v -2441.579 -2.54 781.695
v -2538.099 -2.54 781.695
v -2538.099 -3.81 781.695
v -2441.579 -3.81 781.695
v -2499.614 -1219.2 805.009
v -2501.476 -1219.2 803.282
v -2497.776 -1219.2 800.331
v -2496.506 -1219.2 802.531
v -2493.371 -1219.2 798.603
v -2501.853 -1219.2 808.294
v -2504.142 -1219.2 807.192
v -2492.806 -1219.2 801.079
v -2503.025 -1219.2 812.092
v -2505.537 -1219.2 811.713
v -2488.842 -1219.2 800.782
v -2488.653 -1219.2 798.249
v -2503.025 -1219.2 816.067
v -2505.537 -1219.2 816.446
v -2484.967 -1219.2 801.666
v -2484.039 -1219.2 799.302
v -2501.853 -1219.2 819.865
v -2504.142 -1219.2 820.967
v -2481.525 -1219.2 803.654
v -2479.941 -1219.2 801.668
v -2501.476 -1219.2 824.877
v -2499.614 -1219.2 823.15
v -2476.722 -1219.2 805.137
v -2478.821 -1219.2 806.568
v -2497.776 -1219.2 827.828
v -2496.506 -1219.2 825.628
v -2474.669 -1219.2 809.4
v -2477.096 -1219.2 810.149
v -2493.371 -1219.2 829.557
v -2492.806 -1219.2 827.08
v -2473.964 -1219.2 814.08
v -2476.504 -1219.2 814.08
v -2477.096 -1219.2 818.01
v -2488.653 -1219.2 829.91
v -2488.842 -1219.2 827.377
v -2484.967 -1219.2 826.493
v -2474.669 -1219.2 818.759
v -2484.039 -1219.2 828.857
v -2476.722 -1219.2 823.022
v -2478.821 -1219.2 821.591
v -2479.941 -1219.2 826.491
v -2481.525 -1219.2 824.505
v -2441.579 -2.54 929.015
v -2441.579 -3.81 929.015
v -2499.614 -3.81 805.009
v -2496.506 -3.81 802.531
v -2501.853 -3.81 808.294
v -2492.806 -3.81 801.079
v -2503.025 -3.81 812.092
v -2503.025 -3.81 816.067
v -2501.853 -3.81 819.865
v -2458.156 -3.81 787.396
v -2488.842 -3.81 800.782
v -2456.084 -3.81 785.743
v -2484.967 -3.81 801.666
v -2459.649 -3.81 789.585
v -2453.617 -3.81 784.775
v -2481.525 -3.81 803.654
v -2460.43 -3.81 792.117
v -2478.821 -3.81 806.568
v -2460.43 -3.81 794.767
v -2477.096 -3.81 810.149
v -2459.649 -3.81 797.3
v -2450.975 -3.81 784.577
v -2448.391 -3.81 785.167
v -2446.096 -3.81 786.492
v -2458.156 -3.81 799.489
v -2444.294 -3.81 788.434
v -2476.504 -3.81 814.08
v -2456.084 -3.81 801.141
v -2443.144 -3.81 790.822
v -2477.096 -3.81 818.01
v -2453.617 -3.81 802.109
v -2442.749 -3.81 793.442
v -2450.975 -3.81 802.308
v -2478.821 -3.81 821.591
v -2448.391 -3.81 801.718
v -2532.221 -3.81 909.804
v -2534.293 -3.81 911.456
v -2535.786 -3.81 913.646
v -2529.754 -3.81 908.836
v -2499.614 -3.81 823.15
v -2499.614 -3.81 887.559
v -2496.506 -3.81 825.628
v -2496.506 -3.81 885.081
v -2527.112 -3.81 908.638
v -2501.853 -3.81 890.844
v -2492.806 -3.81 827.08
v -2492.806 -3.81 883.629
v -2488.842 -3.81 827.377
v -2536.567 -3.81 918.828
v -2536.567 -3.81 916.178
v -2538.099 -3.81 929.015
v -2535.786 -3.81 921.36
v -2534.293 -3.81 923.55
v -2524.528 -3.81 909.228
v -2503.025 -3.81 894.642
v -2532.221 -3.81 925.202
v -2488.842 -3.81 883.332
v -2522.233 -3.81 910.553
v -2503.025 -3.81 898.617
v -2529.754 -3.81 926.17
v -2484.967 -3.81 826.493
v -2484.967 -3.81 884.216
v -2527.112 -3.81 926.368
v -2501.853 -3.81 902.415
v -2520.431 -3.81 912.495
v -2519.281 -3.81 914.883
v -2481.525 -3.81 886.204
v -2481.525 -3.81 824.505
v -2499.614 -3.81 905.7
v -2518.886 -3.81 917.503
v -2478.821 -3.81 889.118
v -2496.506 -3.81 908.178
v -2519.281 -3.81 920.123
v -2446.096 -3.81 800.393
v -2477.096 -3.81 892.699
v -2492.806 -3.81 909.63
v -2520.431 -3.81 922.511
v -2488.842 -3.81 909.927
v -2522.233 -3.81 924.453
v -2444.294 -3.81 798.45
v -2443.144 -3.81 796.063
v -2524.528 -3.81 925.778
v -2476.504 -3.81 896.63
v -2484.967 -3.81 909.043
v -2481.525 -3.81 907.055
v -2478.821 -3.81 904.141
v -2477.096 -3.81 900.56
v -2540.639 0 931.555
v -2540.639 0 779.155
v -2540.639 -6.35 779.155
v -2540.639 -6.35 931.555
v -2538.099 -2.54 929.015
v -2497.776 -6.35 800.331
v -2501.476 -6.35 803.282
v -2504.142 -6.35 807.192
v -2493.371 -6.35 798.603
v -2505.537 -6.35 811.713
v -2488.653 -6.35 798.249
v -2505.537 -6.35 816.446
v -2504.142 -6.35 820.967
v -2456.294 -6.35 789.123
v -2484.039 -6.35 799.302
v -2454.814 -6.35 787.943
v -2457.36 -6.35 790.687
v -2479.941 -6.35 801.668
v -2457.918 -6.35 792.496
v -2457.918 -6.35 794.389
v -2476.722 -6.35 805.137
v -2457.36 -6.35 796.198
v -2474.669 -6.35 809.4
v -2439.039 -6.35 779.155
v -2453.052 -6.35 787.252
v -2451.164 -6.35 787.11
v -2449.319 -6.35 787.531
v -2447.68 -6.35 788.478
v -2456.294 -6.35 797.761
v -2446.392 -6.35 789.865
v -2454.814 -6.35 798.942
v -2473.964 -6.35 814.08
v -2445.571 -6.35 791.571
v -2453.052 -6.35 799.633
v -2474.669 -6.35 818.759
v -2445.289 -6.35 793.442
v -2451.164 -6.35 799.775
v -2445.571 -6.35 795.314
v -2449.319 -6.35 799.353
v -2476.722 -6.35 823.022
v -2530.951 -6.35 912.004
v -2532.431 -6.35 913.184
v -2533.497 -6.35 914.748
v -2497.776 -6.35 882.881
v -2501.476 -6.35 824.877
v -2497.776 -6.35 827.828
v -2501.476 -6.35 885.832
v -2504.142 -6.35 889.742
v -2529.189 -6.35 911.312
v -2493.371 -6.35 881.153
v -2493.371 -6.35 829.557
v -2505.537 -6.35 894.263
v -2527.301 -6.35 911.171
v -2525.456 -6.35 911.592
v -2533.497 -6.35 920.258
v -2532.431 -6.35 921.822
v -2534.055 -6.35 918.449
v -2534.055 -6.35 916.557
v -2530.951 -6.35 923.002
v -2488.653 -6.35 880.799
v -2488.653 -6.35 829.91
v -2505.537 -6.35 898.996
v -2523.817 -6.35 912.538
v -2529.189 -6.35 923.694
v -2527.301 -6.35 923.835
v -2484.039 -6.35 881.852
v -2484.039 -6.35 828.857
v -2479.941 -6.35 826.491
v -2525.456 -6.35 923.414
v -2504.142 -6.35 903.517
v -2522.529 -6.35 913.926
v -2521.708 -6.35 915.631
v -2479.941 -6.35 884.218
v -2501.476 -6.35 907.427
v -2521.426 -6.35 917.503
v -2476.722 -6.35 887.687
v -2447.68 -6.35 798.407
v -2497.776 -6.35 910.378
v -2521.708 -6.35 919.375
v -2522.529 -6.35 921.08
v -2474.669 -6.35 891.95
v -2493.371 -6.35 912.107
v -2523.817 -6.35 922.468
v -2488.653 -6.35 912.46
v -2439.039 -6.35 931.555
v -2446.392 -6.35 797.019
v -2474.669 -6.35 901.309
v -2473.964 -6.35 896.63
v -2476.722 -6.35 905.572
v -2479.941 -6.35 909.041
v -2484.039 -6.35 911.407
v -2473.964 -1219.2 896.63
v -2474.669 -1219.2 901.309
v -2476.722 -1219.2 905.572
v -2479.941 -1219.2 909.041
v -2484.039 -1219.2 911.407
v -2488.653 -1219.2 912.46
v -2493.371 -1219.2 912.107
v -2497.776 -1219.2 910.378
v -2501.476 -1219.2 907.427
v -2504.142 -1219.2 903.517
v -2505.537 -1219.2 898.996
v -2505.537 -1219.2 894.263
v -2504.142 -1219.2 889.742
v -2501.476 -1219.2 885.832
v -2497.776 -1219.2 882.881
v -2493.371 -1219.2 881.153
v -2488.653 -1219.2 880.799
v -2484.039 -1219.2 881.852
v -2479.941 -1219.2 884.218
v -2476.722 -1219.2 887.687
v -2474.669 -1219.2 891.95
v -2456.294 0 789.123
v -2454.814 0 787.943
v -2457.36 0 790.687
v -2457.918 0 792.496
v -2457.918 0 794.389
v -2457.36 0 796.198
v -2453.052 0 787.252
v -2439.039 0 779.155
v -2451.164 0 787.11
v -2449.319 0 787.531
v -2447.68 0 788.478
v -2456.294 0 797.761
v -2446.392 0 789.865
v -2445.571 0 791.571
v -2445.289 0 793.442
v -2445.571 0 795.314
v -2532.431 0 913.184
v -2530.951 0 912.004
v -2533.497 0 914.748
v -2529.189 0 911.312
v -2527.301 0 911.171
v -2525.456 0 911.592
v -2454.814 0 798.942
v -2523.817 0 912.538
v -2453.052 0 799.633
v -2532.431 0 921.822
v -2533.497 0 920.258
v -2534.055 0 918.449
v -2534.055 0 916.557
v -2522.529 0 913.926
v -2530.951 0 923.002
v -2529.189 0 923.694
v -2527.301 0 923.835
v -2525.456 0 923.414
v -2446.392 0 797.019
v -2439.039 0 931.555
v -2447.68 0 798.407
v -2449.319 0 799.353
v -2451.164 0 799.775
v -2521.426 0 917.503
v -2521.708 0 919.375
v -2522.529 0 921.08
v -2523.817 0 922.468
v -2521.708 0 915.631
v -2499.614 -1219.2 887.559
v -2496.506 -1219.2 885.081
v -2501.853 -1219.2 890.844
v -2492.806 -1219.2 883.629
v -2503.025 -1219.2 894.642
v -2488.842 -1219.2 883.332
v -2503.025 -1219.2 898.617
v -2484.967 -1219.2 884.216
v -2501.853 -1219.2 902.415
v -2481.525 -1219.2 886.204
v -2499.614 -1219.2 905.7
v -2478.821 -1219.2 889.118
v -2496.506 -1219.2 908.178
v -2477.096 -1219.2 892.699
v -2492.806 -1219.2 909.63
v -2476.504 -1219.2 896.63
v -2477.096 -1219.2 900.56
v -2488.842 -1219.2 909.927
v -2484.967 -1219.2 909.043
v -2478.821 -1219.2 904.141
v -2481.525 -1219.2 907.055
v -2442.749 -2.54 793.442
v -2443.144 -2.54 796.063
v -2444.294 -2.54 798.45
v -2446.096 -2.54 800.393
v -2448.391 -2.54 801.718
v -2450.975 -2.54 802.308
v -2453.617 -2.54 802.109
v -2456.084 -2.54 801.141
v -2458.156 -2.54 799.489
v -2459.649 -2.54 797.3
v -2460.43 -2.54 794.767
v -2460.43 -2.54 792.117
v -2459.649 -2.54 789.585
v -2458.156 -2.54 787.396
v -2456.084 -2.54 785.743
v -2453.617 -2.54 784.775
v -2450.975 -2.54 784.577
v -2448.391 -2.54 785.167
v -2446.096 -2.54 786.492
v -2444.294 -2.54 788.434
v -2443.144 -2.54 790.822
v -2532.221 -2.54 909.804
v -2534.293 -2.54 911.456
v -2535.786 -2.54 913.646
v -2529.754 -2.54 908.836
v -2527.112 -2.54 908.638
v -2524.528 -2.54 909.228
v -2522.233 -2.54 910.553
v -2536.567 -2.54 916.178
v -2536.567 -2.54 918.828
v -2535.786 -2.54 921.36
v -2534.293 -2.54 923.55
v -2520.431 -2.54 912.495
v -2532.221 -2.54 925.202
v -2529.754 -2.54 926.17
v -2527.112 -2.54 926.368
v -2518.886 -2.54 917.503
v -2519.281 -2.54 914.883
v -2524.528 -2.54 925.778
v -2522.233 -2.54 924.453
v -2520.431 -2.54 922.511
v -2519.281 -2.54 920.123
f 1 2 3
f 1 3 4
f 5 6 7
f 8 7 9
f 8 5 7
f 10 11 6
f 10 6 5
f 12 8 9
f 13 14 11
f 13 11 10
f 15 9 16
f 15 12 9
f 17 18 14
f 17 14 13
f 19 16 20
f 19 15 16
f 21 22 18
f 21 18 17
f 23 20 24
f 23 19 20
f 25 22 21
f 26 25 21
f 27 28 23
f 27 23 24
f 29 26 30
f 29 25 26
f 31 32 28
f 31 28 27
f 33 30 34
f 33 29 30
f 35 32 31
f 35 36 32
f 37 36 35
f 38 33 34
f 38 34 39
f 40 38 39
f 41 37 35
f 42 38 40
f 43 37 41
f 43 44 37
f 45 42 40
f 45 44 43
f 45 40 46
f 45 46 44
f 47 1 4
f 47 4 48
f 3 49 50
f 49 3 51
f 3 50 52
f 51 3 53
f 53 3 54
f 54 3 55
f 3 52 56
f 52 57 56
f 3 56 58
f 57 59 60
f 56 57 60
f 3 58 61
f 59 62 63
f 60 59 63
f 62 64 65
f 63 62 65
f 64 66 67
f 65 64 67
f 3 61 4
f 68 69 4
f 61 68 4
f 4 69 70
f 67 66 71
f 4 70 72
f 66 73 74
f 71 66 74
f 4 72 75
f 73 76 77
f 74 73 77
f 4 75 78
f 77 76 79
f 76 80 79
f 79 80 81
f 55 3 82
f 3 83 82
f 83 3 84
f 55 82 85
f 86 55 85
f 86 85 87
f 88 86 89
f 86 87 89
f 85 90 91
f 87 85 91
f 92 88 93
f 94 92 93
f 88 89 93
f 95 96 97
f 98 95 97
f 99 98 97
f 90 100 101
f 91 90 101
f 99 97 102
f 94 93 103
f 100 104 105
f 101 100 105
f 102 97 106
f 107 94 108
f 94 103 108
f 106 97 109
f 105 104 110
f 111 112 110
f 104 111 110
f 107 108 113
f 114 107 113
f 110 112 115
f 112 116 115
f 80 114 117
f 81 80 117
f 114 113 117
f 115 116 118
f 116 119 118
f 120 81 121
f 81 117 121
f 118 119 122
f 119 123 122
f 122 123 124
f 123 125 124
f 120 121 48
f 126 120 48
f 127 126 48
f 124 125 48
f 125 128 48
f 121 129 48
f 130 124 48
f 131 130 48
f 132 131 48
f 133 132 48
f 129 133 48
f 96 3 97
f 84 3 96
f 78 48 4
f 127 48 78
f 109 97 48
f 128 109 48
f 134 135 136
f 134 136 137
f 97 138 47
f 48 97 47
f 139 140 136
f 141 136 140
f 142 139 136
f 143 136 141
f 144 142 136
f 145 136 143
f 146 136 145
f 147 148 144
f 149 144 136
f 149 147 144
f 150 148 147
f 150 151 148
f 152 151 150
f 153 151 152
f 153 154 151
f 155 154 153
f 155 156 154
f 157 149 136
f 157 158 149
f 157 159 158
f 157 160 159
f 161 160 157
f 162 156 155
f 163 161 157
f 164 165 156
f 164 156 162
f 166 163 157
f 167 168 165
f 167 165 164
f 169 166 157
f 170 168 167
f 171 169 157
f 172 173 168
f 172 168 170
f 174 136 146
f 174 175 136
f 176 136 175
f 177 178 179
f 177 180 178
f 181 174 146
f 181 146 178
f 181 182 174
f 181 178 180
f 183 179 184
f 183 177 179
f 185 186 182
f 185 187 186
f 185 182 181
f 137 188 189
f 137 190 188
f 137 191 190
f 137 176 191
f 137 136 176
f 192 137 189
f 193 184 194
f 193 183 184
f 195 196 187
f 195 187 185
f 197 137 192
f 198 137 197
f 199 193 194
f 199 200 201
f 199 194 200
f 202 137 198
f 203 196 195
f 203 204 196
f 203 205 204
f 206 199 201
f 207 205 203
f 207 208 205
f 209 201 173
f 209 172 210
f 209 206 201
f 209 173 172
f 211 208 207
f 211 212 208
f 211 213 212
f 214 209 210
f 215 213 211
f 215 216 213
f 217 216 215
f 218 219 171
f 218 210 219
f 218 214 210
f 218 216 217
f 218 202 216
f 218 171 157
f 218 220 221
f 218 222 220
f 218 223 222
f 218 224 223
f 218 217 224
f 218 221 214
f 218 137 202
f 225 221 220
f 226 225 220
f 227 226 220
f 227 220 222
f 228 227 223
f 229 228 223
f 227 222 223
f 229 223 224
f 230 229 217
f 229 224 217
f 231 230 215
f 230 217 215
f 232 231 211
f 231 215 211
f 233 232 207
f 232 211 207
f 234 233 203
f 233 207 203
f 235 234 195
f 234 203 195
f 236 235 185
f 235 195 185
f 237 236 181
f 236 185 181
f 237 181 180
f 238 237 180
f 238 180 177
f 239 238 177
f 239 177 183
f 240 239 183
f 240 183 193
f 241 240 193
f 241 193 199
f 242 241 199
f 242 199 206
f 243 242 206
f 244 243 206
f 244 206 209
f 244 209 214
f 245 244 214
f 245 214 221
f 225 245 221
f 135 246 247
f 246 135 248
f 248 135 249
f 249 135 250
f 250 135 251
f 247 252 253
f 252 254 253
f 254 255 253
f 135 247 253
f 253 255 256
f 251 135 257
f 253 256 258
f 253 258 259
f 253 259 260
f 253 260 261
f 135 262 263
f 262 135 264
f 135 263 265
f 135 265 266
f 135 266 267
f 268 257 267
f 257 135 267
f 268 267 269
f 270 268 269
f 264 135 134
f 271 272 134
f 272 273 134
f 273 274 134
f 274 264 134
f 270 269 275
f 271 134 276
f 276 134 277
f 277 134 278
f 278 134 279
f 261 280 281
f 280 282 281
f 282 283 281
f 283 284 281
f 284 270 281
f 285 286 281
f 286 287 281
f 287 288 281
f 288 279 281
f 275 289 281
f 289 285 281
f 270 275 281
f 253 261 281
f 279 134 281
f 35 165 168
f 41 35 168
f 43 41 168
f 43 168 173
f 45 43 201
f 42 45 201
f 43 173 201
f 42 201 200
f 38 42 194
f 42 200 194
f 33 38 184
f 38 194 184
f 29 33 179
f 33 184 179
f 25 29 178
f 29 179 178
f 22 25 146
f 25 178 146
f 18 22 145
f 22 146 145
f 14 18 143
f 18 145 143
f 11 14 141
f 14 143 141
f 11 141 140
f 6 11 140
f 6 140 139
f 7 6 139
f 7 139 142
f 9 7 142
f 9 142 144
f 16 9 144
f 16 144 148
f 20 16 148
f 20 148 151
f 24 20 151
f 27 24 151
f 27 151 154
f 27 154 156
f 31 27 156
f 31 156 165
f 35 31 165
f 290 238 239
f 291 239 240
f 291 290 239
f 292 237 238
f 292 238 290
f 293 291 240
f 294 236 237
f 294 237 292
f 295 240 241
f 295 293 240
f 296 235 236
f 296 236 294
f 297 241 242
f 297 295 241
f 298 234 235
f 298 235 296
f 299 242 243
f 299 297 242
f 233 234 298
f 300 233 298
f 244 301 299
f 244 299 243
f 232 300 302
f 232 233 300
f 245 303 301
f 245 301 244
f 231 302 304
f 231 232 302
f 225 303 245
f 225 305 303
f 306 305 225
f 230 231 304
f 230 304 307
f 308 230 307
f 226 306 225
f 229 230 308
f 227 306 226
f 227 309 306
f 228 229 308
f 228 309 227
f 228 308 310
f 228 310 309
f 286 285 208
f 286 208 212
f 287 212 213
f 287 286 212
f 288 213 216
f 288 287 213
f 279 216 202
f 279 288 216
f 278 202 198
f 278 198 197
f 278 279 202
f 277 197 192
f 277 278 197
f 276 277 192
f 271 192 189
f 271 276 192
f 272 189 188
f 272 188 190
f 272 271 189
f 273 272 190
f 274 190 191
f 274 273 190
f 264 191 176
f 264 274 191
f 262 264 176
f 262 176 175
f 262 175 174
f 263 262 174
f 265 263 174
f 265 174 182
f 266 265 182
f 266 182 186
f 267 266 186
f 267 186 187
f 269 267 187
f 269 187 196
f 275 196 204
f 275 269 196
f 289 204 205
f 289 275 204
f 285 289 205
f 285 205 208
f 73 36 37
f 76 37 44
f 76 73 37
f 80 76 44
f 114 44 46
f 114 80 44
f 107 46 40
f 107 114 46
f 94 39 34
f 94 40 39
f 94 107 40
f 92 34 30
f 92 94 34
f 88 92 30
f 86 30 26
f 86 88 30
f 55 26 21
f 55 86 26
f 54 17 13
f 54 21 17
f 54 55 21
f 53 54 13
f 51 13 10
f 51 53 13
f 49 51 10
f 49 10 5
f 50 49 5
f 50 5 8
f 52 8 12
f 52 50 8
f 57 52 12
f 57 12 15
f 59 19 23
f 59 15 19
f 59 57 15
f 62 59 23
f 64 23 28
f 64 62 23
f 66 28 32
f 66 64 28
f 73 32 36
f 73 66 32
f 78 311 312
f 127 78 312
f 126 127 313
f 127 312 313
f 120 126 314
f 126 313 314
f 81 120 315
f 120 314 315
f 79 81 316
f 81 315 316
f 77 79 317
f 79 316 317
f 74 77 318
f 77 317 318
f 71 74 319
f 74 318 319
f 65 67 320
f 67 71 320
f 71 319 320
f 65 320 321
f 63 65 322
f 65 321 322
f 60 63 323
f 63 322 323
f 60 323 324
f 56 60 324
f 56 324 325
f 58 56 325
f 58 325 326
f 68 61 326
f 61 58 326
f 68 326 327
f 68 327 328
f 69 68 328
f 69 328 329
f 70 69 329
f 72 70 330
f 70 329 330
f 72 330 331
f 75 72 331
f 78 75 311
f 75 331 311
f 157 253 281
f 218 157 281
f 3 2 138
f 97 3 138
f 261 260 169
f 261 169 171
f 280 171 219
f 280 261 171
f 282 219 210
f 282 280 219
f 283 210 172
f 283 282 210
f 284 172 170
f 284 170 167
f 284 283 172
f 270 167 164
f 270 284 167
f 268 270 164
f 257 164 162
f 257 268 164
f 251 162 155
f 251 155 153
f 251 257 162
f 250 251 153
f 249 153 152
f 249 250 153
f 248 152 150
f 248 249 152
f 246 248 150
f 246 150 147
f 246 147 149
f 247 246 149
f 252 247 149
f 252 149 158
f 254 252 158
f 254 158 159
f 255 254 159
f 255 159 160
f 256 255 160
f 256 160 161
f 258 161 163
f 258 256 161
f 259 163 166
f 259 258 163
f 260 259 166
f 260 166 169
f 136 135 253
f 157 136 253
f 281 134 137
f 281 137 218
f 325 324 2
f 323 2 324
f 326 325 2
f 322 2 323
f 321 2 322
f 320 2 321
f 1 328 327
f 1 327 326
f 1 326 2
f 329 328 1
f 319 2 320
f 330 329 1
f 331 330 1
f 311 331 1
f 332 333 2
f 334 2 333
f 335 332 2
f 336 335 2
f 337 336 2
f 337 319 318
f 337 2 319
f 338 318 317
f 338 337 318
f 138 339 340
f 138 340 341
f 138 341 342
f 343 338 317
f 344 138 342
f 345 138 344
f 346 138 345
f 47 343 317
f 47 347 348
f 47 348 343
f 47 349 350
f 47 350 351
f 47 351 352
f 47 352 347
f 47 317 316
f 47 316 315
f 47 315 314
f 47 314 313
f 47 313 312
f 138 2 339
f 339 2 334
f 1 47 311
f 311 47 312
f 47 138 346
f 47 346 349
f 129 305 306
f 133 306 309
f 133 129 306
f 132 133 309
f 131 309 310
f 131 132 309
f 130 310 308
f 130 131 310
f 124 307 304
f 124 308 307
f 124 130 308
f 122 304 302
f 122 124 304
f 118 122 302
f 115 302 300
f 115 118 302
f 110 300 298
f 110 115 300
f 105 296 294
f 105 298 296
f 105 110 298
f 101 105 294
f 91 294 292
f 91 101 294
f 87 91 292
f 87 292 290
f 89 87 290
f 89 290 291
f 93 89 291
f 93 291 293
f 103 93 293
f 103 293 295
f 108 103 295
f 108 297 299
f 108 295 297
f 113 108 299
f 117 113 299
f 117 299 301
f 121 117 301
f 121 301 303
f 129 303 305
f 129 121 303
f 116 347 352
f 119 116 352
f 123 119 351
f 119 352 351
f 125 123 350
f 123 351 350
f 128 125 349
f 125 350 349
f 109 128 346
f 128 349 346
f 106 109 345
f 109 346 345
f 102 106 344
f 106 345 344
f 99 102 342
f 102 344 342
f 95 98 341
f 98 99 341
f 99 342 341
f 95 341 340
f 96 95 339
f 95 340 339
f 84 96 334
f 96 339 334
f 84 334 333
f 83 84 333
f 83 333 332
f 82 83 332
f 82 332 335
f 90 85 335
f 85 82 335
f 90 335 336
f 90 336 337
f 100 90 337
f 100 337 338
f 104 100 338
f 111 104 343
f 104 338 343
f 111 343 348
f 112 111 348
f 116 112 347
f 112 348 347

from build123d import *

# Parameters (mm, degrees)
F0_W     = 101.6
F0_H     = 152.4
F0_R     = 15.875
F0_R_2   = 6.35
F1_DEPTH = 6.35
F2_DEPTH = 1219.2
F3_T     = -2.54


with BuildPart() as f1:
    # F0 (on Front) → F1 (new body)
    with BuildSketch(Plane.XZ):
        with Locations((-2489.8389577866, 855.3545203808)):
            Rectangle(F0_W, F0_H)
        with Locations((-2489.8389577866, 814.0795203808)):
            Circle(F0_R, mode=Mode.SUBTRACT)
        with Locations((-2451.6389285668, 793.4423906328)):
            Circle(F0_R_2, mode=Mode.SUBTRACT)
        with Locations((-2527.7759553845, 917.5029841941)):
            Circle(F0_R_2, mode=Mode.SUBTRACT)
        with Locations((-2489.8389577866, 896.6295203808)):
            Circle(F0_R, mode=Mode.SUBTRACT)
    extrude(amount=F1_DEPTH)

    # F0 (on Front) → F2 (join)
    with BuildSketch(Plane.XZ):
        with Locations((-2489.8389577866, 896.6295203808)):
            Circle(F0_R)
        with Locations((-2489.8389577866, 814.0795203808)):
            Circle(F0_R)
    extrude(amount=F2_DEPTH)

    # F3
    f3_openings = [f1.faces().sort_by_distance(p)[0] for p in [
        (-2489.838958, -1219.2, 896.62952),
        (-2489.838958, -1219.2, 814.07952),
    ]]
    offset(amount=F3_T, openings=f3_openings, kind=Kind.INTERSECTION)


solid = f1.part
